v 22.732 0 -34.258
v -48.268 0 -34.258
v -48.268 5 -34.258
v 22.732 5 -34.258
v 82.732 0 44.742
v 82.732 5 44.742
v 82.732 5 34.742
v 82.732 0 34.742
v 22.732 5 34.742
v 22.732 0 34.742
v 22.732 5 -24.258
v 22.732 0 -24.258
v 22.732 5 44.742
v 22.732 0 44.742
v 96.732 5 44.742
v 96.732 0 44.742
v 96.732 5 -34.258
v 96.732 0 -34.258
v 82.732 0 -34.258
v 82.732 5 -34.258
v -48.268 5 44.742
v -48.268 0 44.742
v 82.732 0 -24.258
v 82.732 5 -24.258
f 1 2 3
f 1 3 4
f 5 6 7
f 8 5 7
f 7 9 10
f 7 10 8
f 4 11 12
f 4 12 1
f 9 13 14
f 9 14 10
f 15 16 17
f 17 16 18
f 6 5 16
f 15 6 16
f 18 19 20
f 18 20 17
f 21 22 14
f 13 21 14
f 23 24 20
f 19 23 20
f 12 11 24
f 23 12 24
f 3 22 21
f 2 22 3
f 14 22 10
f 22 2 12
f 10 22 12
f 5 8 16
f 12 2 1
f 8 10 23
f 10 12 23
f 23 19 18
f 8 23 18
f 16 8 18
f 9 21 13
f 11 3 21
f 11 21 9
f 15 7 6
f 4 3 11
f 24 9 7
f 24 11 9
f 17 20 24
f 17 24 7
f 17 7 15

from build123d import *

# Parameters (mm, degrees)
ESQUISSE1_W      = 145
ESQUISSE1_H      = 79
EXTRUSION1_DEPTH = 5
EXTRUSION2_REACH = 108.696
ESQUISSE2_W      = 60
ESQUISSE2_H      = 10


with BuildPart() as part:
    # Esquisse1 → Extrusion1 (new body)
    with BuildSketch(Plane(origin=(0, 0, 0), x_dir=(1, 0, 0), z_dir=(0, 1, 0))):
        with Locations((24.232219602, -5.242282495)):
            Rectangle(ESQUISSE1_W, ESQUISSE1_H)
    extrude(amount=EXTRUSION1_DEPTH)

    # Esquisse2 → Extrusion2 (cut, up to next)
    with BuildSketch(Plane(origin=(0, 5, 0), x_dir=(1, 0, 0), z_dir=(0, 1, 0)), mode=Mode.PRIVATE) as extrusion2_sk1:
        with Locations((52.732219602, 29.257717505)):
            Rectangle(ESQUISSE2_W, ESQUISSE2_H)
    extrusion2_tool1 = extrude(extrusion2_sk1.sketch, amount=-EXTRUSION2_REACH, mode=Mode.PRIVATE) & part.part
    # Esquisse2 → Extrusion2 (cut, up to next)
    with BuildSketch(Plane(origin=(0, 5, 0), x_dir=(1, 0, 0), z_dir=(0, 1, 0)), mode=Mode.PRIVATE) as extrusion2_sk2:
        with Locations((52.732219602, -39.742282495)):
            Rectangle(ESQUISSE2_W, ESQUISSE2_H)
    extrusion2_tool2 = extrude(extrusion2_sk2.sketch, amount=-EXTRUSION2_REACH, mode=Mode.PRIVATE) & part.part
    add(extrusion2_tool1.solids().sort_by_distance((52.73222, 5, -29.257718))[0], mode=Mode.SUBTRACT)
    add(extrusion2_tool2.solids().sort_by_distance((52.73222, 5, 39.742282))[0], mode=Mode.SUBTRACT)


solid = part.part
